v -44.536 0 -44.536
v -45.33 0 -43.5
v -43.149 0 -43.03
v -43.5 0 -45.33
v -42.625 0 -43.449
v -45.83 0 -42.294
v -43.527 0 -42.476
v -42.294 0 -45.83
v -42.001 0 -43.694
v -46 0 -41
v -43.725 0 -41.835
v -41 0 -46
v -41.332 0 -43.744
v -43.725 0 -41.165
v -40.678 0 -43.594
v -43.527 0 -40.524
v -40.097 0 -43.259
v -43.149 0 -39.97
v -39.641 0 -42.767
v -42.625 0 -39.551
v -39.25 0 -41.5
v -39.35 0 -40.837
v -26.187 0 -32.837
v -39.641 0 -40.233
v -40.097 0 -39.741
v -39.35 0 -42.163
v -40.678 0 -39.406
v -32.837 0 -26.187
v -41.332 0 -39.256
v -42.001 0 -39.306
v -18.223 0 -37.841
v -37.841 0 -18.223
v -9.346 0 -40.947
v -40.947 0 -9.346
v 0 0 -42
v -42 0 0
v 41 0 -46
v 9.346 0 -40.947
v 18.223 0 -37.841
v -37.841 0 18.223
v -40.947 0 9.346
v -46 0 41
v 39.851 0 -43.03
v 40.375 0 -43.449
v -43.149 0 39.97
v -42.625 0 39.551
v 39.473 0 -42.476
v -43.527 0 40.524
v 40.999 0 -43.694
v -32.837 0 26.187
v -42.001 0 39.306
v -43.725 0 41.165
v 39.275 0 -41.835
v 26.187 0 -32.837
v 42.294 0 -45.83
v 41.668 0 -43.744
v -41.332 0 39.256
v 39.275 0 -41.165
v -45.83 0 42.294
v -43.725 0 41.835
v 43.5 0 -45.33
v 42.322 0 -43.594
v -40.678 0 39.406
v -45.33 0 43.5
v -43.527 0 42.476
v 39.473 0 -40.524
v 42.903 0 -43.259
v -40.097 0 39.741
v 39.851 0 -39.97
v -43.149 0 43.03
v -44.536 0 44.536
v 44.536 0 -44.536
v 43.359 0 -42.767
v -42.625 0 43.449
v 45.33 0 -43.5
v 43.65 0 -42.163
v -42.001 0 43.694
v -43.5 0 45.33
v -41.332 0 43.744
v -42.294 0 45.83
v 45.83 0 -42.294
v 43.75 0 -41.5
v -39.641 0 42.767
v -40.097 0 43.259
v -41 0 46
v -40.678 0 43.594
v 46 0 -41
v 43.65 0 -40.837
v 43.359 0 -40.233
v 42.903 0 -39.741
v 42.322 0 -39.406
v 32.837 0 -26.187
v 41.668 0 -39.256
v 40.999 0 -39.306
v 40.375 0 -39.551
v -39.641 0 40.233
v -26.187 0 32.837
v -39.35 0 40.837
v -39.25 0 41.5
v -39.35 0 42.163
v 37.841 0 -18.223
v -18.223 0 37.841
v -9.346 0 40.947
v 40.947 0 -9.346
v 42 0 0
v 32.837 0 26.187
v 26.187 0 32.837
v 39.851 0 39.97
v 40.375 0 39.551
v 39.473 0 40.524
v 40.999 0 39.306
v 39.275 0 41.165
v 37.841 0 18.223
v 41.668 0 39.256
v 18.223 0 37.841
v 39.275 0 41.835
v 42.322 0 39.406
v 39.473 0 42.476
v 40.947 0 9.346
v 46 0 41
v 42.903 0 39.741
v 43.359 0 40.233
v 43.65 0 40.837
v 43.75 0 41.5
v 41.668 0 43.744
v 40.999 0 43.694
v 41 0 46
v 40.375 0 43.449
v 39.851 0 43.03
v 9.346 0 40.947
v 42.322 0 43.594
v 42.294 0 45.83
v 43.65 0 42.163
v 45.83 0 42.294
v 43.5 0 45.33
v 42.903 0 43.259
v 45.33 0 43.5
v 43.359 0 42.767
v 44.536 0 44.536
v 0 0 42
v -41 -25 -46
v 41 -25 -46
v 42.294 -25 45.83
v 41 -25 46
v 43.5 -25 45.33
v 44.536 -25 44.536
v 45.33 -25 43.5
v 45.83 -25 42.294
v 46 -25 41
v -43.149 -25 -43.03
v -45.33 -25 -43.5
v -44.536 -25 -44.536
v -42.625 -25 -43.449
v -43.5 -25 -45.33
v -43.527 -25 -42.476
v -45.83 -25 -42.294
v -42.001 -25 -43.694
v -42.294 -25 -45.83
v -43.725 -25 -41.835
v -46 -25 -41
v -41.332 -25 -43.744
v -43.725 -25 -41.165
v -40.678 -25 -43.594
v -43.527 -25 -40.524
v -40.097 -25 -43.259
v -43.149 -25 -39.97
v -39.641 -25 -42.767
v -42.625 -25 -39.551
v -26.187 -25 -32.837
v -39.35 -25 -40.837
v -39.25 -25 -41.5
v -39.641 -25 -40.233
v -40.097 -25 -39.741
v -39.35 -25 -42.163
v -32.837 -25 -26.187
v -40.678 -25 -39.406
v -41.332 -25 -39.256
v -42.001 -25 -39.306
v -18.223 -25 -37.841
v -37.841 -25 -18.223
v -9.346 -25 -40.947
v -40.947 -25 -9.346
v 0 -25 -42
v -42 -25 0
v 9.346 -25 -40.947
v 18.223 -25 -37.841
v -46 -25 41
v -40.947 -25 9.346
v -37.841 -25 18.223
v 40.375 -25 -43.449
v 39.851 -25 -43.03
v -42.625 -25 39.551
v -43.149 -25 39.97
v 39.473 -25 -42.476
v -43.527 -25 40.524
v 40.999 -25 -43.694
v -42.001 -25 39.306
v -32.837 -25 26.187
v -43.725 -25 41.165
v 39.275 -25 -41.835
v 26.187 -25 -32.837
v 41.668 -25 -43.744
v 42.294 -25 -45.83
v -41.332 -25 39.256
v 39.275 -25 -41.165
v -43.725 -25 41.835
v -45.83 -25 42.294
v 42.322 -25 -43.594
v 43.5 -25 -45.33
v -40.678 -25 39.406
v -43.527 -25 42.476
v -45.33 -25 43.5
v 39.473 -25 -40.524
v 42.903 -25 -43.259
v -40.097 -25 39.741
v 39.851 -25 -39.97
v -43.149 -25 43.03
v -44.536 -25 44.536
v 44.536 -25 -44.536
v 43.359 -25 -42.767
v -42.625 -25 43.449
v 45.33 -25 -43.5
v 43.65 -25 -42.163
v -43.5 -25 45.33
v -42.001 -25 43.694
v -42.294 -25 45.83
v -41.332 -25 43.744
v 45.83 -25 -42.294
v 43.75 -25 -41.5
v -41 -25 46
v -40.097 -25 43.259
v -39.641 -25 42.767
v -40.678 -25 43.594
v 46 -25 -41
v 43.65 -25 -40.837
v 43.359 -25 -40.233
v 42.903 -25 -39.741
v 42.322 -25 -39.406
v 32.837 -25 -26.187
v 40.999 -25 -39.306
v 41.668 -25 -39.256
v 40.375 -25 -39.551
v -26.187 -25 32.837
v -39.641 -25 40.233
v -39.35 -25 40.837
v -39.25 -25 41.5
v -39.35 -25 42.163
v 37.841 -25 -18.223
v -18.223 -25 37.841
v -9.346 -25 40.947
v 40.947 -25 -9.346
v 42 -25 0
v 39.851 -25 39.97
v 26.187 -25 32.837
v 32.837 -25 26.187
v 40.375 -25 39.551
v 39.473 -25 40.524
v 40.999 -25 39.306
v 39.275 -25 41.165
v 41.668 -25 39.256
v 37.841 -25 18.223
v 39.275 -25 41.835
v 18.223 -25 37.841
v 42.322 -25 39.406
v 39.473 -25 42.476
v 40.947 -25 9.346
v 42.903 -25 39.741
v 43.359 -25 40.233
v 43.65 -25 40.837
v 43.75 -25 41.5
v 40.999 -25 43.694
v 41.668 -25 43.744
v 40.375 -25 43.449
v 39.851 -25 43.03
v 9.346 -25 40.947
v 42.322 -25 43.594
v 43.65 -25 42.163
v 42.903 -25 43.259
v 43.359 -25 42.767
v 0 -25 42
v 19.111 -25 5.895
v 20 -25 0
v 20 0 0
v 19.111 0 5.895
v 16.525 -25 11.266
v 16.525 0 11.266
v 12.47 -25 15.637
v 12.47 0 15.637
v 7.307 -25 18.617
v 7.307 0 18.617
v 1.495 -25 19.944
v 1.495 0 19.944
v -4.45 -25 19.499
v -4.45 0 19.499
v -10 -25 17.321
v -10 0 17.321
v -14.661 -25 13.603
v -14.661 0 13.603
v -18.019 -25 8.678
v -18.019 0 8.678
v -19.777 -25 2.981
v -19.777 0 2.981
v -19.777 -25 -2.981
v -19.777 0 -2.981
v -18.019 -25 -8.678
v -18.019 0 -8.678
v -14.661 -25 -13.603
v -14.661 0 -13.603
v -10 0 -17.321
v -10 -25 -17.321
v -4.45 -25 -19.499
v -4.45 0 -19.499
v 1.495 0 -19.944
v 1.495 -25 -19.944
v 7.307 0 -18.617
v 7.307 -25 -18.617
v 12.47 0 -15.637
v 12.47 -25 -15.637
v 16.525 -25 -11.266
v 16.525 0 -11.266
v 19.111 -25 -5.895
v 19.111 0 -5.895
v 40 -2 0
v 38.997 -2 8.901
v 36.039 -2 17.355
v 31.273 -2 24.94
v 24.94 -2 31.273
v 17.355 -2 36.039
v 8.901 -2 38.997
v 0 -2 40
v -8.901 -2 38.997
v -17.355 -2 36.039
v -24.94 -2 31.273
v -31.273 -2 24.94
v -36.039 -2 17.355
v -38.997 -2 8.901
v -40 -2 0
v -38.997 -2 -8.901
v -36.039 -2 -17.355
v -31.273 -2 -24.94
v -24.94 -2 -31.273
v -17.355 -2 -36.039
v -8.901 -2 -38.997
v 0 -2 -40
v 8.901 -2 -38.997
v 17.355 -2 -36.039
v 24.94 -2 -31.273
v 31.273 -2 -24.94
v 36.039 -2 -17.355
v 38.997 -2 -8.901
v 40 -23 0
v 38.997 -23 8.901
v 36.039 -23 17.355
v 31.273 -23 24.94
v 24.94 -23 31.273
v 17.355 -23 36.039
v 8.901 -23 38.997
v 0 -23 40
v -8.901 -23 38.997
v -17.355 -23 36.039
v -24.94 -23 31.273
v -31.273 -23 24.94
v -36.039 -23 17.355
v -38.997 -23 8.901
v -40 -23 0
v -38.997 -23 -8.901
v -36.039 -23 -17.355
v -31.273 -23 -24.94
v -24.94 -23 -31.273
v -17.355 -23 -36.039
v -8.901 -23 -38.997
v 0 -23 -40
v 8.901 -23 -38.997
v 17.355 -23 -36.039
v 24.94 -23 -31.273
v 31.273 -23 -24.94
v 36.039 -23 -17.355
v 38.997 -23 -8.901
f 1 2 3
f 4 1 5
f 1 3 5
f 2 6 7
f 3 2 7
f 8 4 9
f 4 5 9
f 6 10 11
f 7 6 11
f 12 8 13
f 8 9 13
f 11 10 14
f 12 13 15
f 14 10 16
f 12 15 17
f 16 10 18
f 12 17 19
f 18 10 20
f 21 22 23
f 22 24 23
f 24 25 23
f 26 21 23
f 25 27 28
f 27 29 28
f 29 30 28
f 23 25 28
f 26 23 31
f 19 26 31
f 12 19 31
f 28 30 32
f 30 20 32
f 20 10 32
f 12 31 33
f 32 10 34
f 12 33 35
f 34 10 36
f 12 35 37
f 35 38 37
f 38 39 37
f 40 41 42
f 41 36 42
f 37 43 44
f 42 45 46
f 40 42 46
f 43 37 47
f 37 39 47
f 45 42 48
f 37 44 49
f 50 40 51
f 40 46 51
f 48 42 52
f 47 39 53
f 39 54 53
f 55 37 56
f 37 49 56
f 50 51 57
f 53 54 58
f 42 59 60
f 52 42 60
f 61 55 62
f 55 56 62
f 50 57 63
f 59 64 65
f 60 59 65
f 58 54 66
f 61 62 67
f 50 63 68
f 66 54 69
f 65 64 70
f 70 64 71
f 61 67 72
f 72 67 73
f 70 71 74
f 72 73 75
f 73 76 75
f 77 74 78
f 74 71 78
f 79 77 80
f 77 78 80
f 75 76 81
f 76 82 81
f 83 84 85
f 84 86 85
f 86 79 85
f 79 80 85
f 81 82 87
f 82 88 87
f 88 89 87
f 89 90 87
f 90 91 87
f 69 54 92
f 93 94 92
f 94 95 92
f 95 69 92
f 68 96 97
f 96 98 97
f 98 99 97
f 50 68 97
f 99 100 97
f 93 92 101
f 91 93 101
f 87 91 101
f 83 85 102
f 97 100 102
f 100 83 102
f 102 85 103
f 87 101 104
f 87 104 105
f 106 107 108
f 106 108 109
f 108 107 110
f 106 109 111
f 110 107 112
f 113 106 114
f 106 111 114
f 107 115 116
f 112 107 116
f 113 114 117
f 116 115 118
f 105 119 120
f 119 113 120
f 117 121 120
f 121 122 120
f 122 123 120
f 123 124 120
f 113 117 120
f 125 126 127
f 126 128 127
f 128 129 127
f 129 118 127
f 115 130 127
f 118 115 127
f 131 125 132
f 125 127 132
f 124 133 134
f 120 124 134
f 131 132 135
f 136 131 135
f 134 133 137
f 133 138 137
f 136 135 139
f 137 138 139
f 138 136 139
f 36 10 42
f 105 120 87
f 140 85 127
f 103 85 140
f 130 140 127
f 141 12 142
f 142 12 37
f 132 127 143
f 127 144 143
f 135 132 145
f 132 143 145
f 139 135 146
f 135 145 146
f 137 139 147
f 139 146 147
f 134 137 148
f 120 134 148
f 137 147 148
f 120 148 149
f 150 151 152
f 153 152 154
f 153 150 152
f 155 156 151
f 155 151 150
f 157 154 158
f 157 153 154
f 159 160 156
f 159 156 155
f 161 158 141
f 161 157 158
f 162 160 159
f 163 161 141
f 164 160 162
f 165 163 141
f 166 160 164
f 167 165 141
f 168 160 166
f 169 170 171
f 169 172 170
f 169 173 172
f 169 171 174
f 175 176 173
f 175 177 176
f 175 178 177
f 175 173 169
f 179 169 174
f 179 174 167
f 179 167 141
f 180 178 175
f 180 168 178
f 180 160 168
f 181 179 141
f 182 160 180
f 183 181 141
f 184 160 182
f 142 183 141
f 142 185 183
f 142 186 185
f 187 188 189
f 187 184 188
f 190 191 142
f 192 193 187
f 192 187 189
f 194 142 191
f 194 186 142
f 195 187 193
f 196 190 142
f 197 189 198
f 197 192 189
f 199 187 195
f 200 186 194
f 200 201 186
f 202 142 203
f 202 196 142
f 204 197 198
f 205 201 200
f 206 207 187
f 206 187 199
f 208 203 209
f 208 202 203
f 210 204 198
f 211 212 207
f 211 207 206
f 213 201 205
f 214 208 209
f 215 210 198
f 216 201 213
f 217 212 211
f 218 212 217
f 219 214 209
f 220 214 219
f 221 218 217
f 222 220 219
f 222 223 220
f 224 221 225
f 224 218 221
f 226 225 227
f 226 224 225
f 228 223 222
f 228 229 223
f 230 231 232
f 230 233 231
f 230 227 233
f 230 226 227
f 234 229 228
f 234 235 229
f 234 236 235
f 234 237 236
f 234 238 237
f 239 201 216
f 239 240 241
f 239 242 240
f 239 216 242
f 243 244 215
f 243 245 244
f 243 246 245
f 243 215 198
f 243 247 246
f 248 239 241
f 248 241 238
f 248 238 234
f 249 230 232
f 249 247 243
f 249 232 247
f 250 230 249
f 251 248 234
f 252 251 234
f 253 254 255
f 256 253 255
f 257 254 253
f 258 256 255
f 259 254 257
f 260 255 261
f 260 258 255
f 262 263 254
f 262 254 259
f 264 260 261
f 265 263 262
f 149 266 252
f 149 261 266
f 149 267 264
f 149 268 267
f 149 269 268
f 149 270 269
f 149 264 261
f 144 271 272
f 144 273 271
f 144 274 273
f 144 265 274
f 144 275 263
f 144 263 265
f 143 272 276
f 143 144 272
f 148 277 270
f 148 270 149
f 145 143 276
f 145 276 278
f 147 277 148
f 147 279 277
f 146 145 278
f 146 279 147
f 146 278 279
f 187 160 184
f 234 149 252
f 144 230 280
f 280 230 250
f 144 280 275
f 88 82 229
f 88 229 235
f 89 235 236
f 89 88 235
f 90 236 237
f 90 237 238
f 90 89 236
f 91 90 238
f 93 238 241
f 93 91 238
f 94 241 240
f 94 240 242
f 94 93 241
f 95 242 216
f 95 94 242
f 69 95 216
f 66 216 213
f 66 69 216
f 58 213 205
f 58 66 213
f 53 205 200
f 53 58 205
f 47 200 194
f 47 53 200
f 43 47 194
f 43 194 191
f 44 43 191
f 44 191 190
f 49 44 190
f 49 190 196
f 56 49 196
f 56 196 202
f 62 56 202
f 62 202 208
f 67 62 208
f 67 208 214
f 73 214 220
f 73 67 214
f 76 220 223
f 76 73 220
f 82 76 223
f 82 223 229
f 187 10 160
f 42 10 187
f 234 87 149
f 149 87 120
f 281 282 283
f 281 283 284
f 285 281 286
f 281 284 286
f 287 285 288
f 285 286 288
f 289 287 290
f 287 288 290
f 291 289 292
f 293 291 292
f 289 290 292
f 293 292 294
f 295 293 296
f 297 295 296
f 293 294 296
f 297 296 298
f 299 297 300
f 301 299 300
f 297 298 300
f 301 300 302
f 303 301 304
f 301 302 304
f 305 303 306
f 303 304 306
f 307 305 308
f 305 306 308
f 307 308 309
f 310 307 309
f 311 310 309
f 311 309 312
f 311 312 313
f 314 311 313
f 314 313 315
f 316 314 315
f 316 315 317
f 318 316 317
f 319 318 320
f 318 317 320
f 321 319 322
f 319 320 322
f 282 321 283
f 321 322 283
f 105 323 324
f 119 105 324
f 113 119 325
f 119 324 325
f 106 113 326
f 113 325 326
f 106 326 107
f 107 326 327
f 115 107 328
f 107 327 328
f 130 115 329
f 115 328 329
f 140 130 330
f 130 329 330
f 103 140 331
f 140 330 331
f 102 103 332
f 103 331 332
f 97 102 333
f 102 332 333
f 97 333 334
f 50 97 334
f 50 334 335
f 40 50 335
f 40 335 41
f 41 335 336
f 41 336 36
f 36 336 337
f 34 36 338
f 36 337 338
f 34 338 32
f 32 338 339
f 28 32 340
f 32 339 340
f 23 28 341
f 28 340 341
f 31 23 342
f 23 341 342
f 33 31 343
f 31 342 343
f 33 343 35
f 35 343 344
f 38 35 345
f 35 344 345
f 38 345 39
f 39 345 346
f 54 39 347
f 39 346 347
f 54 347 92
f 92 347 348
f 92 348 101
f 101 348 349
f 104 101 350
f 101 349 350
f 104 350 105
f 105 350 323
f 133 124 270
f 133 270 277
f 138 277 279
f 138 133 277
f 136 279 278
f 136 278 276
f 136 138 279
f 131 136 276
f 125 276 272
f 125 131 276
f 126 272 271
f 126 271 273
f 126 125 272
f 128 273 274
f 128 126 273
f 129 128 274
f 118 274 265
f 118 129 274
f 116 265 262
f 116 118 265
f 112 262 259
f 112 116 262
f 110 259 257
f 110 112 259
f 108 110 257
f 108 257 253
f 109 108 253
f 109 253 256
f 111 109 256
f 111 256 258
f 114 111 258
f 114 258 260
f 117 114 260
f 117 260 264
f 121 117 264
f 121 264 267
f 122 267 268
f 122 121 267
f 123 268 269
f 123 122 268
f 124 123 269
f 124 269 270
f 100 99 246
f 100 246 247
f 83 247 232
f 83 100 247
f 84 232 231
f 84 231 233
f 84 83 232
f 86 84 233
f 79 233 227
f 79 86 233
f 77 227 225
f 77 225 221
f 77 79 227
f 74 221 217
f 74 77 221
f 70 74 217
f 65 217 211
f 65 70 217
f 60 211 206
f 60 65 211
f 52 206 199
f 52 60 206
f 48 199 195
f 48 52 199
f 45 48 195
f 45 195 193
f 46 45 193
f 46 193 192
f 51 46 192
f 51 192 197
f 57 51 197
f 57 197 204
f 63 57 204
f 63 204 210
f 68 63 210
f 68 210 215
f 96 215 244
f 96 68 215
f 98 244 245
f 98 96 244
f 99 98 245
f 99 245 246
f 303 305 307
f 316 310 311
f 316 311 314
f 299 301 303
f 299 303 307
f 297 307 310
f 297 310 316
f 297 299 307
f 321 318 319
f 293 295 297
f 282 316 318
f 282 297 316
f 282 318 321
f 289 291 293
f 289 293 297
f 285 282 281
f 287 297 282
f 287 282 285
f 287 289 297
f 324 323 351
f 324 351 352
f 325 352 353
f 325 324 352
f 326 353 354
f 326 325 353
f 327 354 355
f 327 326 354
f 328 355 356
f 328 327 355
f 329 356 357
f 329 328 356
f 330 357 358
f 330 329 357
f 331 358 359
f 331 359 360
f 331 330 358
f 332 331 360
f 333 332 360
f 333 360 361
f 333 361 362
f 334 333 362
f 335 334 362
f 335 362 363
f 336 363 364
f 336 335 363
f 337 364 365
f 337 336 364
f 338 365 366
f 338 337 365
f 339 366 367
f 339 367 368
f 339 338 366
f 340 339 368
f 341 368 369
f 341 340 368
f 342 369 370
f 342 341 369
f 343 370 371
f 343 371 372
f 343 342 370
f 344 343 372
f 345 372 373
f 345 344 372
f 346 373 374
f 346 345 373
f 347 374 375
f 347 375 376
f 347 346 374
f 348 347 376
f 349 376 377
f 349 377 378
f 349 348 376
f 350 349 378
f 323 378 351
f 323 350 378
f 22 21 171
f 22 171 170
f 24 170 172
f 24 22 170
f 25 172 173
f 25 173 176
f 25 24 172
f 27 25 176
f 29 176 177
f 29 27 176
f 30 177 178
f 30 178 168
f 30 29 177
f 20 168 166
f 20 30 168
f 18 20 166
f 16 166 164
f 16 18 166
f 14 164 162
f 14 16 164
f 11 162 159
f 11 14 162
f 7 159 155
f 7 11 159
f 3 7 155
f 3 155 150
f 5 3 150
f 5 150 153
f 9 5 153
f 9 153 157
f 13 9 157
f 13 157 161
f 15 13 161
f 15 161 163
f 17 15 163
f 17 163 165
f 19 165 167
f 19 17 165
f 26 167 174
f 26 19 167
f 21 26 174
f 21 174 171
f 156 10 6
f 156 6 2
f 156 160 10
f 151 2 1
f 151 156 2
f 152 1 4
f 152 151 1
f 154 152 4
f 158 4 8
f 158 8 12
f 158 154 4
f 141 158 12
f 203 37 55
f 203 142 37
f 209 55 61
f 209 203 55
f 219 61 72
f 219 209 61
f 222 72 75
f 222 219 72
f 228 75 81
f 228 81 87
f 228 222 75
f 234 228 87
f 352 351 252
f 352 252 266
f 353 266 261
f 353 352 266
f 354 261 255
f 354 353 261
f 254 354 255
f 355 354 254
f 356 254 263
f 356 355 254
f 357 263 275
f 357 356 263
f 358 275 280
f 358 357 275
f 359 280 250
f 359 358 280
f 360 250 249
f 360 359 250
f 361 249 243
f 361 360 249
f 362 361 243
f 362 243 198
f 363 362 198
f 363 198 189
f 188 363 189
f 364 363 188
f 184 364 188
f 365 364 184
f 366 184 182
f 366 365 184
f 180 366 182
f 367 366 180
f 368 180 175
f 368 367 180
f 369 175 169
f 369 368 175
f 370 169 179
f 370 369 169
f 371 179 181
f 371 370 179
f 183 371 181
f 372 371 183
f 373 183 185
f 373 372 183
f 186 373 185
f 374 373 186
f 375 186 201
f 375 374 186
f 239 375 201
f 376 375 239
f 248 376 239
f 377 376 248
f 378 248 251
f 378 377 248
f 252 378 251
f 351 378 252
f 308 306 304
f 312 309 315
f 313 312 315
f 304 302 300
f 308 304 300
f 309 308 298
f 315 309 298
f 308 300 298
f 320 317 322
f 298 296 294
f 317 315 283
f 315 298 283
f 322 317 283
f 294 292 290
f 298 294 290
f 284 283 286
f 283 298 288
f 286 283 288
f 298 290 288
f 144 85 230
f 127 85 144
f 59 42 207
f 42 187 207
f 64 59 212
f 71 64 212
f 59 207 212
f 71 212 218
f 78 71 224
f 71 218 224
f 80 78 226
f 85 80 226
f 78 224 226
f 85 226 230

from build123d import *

# Parameters (mm, degrees)
F0_W     = 92
F0_H     = 92
F0_R     = 2.25
F0_R_2   = 40
F0_R_3   = 20
F1_DEPTH = 25
F2_R     = 5
F3_SIZE  = 2


with BuildPart() as f1:
    # F0 (on Front) → F1 (new body)
    with BuildSketch(Plane.XZ):
        Rectangle(F0_W, F0_H)
        with Locations((-41.5, -41.5)):
            Circle(F0_R, mode=Mode.SUBTRACT)
        with Locations((41.5, -41.5)):
            Circle(F0_R, mode=Mode.SUBTRACT)
        with Locations((-41.5, 41.5)):
            Circle(F0_R, mode=Mode.SUBTRACT)
        Circle(F0_R_2, mode=Mode.SUBTRACT)
        with Locations((41.5, 41.5)):
            Circle(F0_R, mode=Mode.SUBTRACT)
        Circle(F0_R_3)
    extrude(amount=F1_DEPTH)

    # F2
    f2_edges = [f1.edges().sort_by_distance(p)[0] for p in [
        (46, -12.5, 46),
        (-46, -12.5, 46),
        (46, -12.5, -46),
        (-46, -12.5, -46),
    ]]
    fillet(f2_edges, radius=F2_R)

    # F3
    f3_edges = [f1.edges().sort_by_distance(p)[0] for p in [
        (-40, -25, 0),
        (-40, 0, 0),
    ]]
    chamfer(f3_edges, length=F3_SIZE)


solid = f1.part
